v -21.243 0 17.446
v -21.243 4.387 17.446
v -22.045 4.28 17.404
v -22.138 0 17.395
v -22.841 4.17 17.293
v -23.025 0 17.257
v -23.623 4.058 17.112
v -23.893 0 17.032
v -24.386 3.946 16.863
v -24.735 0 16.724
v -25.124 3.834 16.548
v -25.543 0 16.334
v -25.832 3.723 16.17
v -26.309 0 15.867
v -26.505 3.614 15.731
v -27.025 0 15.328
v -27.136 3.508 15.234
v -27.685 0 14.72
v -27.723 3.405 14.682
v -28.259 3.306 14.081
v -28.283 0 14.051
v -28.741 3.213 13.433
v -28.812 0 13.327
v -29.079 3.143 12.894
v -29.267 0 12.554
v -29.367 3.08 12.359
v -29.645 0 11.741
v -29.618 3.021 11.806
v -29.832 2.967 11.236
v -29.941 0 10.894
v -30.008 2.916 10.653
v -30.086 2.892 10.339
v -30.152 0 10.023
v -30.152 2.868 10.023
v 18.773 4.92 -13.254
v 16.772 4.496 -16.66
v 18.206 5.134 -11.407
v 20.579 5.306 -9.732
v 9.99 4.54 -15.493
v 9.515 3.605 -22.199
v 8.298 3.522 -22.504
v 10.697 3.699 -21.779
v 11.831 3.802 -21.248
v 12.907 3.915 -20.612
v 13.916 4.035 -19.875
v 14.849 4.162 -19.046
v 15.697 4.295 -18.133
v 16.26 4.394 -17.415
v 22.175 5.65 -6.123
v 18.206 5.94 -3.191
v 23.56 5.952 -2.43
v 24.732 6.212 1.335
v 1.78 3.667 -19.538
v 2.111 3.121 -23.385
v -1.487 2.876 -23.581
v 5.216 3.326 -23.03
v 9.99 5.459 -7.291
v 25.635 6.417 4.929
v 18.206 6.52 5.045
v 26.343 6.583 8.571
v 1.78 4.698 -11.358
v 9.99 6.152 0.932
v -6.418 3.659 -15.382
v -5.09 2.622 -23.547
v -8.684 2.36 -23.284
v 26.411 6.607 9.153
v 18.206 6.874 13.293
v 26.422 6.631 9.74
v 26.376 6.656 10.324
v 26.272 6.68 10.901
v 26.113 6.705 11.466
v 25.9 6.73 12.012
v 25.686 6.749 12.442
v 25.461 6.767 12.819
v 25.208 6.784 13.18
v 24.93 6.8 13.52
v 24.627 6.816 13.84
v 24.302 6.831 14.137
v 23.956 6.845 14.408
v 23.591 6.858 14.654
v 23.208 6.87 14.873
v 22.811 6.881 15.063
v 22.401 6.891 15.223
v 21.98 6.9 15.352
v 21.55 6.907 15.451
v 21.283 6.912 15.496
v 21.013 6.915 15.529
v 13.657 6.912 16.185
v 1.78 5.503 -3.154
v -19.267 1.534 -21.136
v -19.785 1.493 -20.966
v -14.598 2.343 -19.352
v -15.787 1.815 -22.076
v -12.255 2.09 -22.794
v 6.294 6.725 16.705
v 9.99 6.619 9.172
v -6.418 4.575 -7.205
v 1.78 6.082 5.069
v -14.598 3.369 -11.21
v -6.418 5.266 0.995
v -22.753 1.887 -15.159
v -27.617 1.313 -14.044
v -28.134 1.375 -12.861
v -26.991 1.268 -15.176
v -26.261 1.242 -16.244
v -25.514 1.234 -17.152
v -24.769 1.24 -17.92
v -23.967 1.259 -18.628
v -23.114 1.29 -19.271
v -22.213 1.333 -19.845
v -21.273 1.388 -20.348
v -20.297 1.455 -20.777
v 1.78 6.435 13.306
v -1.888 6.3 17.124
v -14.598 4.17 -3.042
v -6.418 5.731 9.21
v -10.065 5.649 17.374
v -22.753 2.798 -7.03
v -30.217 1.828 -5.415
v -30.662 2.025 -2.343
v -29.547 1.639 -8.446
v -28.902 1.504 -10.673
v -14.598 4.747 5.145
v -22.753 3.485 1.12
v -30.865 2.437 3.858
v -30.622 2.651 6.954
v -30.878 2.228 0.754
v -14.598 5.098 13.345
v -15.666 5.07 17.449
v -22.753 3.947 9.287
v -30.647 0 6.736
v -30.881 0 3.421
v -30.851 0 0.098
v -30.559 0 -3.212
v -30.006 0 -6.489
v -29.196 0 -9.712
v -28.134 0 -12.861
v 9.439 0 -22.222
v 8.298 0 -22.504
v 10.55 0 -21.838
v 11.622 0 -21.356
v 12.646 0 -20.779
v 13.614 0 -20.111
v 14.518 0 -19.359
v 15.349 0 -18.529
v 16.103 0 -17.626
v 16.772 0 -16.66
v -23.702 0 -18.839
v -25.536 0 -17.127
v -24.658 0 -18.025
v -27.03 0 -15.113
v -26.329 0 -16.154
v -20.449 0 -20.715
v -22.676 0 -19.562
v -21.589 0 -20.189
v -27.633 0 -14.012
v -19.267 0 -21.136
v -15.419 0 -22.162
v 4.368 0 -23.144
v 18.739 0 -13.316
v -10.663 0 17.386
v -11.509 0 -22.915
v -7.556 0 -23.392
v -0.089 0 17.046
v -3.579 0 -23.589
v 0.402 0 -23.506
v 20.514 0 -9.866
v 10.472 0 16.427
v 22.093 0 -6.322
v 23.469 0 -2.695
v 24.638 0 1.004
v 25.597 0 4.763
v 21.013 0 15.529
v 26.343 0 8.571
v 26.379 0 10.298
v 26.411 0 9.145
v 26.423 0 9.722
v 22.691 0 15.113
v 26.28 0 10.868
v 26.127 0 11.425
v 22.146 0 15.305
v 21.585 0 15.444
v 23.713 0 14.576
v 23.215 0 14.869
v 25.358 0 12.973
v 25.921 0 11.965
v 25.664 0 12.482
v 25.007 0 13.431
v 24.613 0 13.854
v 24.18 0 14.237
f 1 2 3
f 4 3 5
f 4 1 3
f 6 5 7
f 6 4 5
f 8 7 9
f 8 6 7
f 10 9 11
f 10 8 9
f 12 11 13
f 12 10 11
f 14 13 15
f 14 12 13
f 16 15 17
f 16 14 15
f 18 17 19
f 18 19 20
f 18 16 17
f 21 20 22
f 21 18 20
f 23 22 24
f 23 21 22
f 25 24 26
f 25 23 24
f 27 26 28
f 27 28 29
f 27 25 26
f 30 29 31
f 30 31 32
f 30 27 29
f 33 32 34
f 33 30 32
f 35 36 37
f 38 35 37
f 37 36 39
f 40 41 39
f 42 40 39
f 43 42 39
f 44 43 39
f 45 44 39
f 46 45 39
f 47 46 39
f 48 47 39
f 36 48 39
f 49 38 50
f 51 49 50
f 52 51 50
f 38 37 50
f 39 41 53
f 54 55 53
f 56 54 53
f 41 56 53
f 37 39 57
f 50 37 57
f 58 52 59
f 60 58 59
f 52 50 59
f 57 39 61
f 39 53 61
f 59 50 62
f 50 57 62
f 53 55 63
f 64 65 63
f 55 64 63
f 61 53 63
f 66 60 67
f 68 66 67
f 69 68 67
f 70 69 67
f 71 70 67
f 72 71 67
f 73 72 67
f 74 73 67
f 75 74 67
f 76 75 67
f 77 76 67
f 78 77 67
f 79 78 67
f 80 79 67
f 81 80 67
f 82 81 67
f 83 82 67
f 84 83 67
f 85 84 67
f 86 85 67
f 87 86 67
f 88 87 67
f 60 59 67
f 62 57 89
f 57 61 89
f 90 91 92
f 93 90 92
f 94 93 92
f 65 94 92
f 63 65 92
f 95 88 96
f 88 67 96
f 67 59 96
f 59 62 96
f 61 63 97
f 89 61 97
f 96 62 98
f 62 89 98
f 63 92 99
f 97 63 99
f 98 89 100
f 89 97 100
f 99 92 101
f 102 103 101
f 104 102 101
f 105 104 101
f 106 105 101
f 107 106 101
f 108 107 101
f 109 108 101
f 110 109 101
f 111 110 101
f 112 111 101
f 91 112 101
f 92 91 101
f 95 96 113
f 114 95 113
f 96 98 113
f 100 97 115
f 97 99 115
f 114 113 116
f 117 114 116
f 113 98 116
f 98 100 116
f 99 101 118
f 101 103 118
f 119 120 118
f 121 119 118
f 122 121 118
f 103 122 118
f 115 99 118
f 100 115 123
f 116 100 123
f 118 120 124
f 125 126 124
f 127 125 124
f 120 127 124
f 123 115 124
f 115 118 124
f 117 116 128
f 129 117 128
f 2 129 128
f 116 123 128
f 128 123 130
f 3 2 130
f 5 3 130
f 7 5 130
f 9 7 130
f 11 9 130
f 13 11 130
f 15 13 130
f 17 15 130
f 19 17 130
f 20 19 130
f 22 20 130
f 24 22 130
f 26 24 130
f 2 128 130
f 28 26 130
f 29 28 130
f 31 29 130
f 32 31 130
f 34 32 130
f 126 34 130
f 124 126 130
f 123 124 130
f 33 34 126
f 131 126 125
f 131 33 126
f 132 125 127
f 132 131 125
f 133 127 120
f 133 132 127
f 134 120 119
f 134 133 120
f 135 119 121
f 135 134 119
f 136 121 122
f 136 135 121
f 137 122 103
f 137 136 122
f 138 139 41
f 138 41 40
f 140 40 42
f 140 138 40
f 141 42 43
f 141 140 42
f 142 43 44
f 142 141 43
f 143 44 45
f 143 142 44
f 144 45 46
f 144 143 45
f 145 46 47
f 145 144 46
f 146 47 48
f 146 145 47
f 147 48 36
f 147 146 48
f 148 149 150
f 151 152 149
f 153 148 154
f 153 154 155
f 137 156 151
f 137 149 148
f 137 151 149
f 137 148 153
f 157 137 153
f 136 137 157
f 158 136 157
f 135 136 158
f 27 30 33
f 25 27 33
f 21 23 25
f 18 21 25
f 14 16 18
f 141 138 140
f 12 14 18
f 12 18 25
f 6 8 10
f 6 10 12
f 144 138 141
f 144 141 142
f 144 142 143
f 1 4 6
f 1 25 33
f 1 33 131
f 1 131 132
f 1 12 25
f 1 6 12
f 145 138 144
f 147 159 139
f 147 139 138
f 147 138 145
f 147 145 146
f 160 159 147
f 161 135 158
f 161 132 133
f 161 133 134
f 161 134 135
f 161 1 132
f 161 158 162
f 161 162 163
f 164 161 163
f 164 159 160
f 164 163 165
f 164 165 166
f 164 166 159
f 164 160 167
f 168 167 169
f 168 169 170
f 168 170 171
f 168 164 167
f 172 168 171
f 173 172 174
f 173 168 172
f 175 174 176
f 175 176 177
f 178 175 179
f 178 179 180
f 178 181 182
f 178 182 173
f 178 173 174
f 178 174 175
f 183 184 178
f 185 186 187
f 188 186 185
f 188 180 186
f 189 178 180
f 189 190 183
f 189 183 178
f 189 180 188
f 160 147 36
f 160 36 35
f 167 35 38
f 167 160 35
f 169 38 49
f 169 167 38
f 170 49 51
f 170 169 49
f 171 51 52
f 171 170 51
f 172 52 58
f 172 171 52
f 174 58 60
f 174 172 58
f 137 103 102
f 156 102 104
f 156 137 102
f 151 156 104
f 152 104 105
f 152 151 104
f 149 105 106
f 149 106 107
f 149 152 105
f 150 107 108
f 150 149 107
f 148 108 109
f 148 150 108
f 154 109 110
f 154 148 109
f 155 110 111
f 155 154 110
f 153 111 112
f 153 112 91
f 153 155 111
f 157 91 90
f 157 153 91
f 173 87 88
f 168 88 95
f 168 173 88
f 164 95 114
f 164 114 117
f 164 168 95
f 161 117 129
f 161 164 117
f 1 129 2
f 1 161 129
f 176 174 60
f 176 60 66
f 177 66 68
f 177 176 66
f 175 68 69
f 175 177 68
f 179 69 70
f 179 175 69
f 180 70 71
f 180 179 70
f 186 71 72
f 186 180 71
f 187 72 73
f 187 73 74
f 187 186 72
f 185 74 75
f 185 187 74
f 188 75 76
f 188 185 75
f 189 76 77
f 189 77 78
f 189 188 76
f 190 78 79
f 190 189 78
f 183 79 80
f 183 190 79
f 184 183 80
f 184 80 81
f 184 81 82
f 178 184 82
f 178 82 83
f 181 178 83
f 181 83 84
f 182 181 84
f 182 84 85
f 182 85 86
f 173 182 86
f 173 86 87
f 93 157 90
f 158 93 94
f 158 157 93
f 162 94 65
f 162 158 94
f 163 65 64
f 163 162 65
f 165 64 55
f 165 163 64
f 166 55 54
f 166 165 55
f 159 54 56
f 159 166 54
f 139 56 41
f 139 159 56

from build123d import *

# Parameters (mm, degrees)
F1_DEPTH      = 25
F4_ANGLE_BACK = 15
F4_ANGLE      = 30


with BuildPart() as f1:
    # F0 (on Front) → F1 (new body)
    with BuildSketch(Plane.XZ):
        with BuildLine():
            ThreePointArc((26.3431364877, 8.5707053028), (25.1879544986, 13.2060879092), (21.0133194591, 15.5285089783))
            ThreePointArc((21.0133194591, 15.5285089783), (-0.0894086287, 17.0460813995), (-21.2428583947, 17.4457334904))
            ThreePointArc((-21.2428583947, 17.4457334904), (-27.0252643869, 15.3277245971), (-30.1521339791, 10.0225509634))
            ThreePointArc((-30.1521339791, 10.0225509634), (-30.737948683, -1.5598670025), (-28.1338702514, -12.8609448416))
            ThreePointArc((-28.1338702514, -12.8609448416), (-24.6579753008, -18.0246958087), (-19.2665178824, -21.1357015406))
            ThreePointArc((-19.2665178824, -21.1357015406), (-5.5690318774, -23.5254263951), (8.2977543738, -22.503591381))
            ThreePointArc((8.2977543738, -22.503591381), (13.1377213939, -20.4559972218), (16.7715565718, -16.6595298512))
            ThreePointArc((16.7715565718, -16.6595298512), (22.8064529235, -4.5182850542), (26.3431364877, 8.5707053028))
        make_face()
    extrude(amount=-F1_DEPTH)


with BuildPart() as f4:
    # F3 (on offset) → F4 (revolve)
    with BuildSketch(Plane.XY.offset(22), mode=Mode.PRIVATE) as f4_sk:
        with BuildLine():
            Line((-282, -293), (318, -293))
            ThreePointArc((318, -293), (18, 7), (-282, -293))
        make_face()
    revolve(f4_sk.sketch.rotate(Axis((18, -293, 22), (1, 0, 0)), -F4_ANGLE_BACK), axis=Axis((18, -293, 22), (1, 0, 0)), revolution_arc=F4_ANGLE)


with BuildPart() as f1_1:
    add(f1.part)

    # F5: intersect F4
    add(f4.part, mode=Mode.INTERSECT)


solid = f1_1.part
